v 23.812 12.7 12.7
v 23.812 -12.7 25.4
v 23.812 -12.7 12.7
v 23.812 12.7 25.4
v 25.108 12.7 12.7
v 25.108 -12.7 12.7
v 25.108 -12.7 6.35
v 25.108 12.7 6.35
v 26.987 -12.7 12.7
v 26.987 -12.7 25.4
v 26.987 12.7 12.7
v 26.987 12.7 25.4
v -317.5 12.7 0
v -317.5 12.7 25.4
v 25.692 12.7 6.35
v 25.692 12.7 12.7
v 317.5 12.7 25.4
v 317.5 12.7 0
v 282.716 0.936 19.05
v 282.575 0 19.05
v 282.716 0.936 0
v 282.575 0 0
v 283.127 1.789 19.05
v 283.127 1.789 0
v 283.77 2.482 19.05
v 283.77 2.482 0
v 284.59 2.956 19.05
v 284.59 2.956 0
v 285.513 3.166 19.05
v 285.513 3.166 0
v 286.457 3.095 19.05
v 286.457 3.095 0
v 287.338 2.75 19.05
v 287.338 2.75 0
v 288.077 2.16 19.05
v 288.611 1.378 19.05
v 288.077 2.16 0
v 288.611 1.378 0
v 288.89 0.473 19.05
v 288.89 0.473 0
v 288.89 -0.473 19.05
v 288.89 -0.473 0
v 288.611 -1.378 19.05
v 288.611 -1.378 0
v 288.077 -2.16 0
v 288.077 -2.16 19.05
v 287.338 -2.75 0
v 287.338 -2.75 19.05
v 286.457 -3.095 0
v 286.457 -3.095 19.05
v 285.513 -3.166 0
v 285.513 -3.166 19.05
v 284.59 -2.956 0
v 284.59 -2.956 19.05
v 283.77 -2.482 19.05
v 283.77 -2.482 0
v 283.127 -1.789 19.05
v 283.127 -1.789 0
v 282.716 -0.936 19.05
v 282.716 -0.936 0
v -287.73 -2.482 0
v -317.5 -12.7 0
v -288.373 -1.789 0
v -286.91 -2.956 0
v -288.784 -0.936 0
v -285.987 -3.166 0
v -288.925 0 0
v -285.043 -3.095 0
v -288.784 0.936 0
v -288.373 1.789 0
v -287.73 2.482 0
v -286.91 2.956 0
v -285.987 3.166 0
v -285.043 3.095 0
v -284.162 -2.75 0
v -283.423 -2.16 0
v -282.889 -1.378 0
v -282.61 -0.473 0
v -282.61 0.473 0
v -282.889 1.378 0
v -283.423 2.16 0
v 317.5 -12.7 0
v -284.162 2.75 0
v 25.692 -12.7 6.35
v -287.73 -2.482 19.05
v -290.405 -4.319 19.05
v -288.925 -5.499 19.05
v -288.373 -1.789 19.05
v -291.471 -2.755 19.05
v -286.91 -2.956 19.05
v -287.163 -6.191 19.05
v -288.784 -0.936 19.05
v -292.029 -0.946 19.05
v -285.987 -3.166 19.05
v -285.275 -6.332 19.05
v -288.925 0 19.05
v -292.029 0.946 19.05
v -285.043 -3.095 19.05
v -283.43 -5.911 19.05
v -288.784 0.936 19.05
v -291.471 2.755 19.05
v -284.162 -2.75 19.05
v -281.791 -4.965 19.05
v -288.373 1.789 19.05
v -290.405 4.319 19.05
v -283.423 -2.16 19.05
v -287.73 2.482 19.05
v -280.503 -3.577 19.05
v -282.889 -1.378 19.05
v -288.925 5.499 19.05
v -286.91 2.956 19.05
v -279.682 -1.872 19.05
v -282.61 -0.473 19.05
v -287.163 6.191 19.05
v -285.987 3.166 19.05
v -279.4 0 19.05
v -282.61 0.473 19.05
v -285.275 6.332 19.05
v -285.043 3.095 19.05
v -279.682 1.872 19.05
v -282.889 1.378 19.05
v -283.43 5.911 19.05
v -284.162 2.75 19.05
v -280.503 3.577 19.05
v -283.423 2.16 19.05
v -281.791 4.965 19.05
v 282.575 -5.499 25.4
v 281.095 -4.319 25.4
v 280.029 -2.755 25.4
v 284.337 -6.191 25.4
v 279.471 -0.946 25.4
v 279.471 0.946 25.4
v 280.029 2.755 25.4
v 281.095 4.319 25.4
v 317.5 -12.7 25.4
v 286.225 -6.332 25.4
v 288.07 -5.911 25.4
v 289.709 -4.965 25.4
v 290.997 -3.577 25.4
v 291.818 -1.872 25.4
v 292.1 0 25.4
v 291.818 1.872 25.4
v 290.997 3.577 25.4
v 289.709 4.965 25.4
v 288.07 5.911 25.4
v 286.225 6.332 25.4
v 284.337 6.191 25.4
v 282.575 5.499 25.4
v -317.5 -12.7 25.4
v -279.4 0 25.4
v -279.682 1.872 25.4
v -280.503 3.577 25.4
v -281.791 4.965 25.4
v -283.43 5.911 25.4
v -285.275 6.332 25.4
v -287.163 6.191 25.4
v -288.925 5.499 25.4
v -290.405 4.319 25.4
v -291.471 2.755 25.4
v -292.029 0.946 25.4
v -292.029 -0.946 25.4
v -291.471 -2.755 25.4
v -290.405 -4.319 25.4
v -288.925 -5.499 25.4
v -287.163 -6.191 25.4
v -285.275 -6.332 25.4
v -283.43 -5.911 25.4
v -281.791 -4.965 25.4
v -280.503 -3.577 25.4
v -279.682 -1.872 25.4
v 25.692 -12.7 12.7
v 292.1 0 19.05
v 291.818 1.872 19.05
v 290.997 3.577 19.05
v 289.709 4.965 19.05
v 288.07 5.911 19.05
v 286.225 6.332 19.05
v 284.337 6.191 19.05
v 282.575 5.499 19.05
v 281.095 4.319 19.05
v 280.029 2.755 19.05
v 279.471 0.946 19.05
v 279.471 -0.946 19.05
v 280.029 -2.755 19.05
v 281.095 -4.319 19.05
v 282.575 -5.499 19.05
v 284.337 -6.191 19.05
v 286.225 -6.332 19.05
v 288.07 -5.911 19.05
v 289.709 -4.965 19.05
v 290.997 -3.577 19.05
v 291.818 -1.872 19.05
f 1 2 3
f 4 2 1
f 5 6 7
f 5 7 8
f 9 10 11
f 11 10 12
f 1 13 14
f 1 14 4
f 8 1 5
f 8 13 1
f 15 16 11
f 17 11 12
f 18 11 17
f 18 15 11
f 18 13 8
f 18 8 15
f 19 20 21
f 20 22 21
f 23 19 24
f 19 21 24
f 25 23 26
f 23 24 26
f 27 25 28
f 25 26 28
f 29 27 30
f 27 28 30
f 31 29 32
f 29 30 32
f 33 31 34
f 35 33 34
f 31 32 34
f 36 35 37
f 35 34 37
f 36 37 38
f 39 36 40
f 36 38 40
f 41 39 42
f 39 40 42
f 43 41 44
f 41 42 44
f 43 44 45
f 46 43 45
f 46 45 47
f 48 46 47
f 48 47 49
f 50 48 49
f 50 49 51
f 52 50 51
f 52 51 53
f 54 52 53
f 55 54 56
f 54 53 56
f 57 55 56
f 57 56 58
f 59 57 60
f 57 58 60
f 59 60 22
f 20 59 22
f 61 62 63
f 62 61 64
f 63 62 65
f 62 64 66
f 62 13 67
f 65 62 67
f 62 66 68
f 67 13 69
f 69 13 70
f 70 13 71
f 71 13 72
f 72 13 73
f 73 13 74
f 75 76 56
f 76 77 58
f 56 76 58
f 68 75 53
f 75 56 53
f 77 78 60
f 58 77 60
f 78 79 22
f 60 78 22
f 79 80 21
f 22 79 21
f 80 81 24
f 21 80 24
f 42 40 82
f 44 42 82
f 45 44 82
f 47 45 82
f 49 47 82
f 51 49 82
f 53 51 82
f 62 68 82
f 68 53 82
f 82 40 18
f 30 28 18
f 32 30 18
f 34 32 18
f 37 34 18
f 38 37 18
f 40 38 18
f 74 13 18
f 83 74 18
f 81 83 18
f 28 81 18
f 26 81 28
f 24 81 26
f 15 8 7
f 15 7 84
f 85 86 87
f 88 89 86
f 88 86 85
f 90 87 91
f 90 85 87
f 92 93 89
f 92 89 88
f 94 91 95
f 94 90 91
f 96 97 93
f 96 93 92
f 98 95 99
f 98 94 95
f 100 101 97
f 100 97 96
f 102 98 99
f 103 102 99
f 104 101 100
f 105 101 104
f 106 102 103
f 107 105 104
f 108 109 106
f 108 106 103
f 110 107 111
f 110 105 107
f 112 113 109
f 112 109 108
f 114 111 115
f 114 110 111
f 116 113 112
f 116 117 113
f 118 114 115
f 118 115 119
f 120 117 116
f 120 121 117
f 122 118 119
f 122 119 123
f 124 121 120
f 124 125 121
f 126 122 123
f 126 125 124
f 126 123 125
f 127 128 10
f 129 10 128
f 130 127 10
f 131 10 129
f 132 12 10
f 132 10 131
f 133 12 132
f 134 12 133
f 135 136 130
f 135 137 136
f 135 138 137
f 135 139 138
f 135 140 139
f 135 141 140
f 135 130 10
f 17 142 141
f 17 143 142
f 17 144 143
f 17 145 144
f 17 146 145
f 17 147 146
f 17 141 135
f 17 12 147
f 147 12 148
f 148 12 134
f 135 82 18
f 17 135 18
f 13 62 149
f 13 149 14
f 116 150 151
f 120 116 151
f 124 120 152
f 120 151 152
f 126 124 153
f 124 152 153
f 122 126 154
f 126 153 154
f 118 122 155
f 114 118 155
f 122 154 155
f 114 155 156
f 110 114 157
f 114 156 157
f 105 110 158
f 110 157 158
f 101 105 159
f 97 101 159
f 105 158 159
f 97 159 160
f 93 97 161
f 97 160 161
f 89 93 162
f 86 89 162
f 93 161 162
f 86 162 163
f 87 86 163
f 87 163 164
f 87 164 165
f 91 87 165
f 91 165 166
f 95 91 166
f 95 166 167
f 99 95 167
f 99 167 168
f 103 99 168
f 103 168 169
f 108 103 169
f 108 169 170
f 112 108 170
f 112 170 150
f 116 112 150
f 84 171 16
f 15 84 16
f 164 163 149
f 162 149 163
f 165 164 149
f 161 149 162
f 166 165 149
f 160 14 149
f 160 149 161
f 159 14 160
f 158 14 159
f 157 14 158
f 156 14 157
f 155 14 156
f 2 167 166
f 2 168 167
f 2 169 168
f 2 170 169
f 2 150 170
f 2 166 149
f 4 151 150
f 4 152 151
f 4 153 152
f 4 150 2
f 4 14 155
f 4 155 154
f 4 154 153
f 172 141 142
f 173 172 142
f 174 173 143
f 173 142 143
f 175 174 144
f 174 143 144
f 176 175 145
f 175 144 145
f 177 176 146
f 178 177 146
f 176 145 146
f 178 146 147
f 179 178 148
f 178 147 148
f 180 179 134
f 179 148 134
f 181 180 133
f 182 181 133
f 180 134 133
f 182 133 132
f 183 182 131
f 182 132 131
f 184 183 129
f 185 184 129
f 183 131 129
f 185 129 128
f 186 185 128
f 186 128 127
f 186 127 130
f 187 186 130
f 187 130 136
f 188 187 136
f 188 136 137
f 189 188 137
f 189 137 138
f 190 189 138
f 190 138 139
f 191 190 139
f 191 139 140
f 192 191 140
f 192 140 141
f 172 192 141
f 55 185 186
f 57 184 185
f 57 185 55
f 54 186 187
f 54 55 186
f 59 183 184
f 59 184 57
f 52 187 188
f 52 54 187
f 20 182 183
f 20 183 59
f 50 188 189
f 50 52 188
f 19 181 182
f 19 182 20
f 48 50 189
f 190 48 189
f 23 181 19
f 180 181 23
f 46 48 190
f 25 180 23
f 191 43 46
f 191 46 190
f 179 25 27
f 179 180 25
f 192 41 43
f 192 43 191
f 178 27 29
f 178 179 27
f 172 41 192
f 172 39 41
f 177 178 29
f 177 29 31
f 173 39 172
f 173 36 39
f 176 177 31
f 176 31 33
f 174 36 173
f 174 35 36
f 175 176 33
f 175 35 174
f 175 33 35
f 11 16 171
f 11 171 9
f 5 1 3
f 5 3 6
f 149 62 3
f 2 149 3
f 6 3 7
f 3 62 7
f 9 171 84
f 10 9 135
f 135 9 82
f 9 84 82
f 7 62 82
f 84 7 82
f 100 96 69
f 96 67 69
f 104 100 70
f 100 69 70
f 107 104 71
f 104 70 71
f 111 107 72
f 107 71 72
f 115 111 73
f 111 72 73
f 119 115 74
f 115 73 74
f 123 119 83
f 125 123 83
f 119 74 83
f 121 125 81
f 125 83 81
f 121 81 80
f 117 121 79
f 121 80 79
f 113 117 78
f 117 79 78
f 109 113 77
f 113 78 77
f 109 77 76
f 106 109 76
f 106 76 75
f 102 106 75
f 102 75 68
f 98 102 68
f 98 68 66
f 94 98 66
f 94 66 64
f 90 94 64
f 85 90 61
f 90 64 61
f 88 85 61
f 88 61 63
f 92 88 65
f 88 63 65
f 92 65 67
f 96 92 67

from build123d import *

# Parameters (mm, degrees)
F0_W           = 635
F0_H           = 25.4
F1_DEPTH       = 25.4
F3_D           = 6.35
F3_CBORE_D     = 12.7
F3_CBORE_DEPTH = 6.35
F4_W           = 0.5842
F4_H           = 25.4
F5_DEPTH       = 19.05
F6_W           = 3.175
F6_H           = 25.4
F7_DEPTH       = 12.7


with BuildPart() as f1:
    # F0 (on Top) → F1 (new body)
    with BuildSketch(Plane.XY):
        Rectangle(F0_W, F0_H)
    extrude(amount=F1_DEPTH)

    # F3 (through all)
    with Locations(Plane.XY.offset(25.4)):
        with Locations((-285.75, 0), (285.75, 0)):
            CounterBoreHole(F3_D / 2, F3_CBORE_D / 2, F3_CBORE_DEPTH)

    # F4 (on face) → F5 (cut)
    with BuildSketch(Plane.XY.offset(25.4)):
        with Locations((25.4, 0)):
            Rectangle(F4_W, F4_H)
    extrude(amount=-F5_DEPTH, mode=Mode.SUBTRACT)

    # F6 (on face) → F7 (cut)
    with BuildSketch(Plane.XY.offset(25.4)):
        with Locations((25.4, 0)):
            Rectangle(F6_W, F6_H)
    extrude(amount=-F7_DEPTH, mode=Mode.SUBTRACT)


solid = f1.part
